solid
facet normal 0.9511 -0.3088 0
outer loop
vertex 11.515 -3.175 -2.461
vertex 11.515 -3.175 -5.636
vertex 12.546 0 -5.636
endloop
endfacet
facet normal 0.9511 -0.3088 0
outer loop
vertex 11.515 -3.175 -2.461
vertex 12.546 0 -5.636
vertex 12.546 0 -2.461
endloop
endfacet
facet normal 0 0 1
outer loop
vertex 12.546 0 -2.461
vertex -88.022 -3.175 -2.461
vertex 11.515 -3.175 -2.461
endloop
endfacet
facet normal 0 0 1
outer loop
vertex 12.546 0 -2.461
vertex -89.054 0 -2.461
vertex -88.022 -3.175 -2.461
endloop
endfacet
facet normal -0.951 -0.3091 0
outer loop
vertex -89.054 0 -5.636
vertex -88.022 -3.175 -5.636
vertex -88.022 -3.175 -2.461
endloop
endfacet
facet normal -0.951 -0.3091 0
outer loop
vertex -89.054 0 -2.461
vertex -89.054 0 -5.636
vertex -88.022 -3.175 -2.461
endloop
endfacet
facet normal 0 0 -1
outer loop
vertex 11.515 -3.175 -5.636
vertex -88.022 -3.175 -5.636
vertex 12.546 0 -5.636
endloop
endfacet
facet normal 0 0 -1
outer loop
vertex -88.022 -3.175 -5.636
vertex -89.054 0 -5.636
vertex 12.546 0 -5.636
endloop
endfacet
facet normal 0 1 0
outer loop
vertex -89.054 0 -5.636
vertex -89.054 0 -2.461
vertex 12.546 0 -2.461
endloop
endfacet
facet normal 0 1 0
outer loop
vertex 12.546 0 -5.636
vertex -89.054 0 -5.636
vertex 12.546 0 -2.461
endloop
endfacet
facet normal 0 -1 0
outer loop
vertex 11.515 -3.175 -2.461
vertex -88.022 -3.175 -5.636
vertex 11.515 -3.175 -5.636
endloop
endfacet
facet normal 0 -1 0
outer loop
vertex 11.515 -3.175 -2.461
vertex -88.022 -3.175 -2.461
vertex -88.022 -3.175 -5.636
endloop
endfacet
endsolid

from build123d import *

# Parameters (mm, degrees)
F0_W     = 101.6
F0_H     = 3.175
F1_DEPTH = 3.175
F2_SIZE2 = 1.03161
F2_SIZE  = 3.17499
F3_SIZE2 = 1.03161
F3_SIZE  = 3.17499


# Not quite as in the source:
# - a fillet or chamfer is up to 0.001 mm smaller than in the source, because OpenCascade refuses the exact size


with BuildPart() as f1:
    # F0 (on Front) → F1 (new body)
    with BuildSketch(Plane.XZ):
        with Locations((-38.2536438465, -4.0487329051)):
            Rectangle(F0_W, F0_H)
    extrude(amount=F1_DEPTH)

    # F2 (size 3.175 and 1.0316200355 in the source; OpenCascade refuses exactly that, so slightly less here)
    f2_edges = [f1.edges().sort_by_distance(p)[0] for p in [
        (-89.053644, -3.175, -4.048733),
    ]]
    f2_side = f1.faces().sort_by_distance((-89.053644, -1.5875, -4.048733))[0]
    chamfer(f2_edges, length=F2_SIZE, length2=F2_SIZE2, reference=f2_side)

    # F3 (size 3.175 and 1.0316200355 in the source; OpenCascade refuses exactly that, so slightly less here)
    f3_edges = [f1.edges().sort_by_distance(p)[0] for p in [
        (12.546356, -3.175, -4.048733),
    ]]
    f3_side = f1.faces().sort_by_distance((12.546356, -1.5875, -4.048733))[0]
    chamfer(f3_edges, length=F3_SIZE, length2=F3_SIZE2, reference=f3_side)


solid = f1.part
